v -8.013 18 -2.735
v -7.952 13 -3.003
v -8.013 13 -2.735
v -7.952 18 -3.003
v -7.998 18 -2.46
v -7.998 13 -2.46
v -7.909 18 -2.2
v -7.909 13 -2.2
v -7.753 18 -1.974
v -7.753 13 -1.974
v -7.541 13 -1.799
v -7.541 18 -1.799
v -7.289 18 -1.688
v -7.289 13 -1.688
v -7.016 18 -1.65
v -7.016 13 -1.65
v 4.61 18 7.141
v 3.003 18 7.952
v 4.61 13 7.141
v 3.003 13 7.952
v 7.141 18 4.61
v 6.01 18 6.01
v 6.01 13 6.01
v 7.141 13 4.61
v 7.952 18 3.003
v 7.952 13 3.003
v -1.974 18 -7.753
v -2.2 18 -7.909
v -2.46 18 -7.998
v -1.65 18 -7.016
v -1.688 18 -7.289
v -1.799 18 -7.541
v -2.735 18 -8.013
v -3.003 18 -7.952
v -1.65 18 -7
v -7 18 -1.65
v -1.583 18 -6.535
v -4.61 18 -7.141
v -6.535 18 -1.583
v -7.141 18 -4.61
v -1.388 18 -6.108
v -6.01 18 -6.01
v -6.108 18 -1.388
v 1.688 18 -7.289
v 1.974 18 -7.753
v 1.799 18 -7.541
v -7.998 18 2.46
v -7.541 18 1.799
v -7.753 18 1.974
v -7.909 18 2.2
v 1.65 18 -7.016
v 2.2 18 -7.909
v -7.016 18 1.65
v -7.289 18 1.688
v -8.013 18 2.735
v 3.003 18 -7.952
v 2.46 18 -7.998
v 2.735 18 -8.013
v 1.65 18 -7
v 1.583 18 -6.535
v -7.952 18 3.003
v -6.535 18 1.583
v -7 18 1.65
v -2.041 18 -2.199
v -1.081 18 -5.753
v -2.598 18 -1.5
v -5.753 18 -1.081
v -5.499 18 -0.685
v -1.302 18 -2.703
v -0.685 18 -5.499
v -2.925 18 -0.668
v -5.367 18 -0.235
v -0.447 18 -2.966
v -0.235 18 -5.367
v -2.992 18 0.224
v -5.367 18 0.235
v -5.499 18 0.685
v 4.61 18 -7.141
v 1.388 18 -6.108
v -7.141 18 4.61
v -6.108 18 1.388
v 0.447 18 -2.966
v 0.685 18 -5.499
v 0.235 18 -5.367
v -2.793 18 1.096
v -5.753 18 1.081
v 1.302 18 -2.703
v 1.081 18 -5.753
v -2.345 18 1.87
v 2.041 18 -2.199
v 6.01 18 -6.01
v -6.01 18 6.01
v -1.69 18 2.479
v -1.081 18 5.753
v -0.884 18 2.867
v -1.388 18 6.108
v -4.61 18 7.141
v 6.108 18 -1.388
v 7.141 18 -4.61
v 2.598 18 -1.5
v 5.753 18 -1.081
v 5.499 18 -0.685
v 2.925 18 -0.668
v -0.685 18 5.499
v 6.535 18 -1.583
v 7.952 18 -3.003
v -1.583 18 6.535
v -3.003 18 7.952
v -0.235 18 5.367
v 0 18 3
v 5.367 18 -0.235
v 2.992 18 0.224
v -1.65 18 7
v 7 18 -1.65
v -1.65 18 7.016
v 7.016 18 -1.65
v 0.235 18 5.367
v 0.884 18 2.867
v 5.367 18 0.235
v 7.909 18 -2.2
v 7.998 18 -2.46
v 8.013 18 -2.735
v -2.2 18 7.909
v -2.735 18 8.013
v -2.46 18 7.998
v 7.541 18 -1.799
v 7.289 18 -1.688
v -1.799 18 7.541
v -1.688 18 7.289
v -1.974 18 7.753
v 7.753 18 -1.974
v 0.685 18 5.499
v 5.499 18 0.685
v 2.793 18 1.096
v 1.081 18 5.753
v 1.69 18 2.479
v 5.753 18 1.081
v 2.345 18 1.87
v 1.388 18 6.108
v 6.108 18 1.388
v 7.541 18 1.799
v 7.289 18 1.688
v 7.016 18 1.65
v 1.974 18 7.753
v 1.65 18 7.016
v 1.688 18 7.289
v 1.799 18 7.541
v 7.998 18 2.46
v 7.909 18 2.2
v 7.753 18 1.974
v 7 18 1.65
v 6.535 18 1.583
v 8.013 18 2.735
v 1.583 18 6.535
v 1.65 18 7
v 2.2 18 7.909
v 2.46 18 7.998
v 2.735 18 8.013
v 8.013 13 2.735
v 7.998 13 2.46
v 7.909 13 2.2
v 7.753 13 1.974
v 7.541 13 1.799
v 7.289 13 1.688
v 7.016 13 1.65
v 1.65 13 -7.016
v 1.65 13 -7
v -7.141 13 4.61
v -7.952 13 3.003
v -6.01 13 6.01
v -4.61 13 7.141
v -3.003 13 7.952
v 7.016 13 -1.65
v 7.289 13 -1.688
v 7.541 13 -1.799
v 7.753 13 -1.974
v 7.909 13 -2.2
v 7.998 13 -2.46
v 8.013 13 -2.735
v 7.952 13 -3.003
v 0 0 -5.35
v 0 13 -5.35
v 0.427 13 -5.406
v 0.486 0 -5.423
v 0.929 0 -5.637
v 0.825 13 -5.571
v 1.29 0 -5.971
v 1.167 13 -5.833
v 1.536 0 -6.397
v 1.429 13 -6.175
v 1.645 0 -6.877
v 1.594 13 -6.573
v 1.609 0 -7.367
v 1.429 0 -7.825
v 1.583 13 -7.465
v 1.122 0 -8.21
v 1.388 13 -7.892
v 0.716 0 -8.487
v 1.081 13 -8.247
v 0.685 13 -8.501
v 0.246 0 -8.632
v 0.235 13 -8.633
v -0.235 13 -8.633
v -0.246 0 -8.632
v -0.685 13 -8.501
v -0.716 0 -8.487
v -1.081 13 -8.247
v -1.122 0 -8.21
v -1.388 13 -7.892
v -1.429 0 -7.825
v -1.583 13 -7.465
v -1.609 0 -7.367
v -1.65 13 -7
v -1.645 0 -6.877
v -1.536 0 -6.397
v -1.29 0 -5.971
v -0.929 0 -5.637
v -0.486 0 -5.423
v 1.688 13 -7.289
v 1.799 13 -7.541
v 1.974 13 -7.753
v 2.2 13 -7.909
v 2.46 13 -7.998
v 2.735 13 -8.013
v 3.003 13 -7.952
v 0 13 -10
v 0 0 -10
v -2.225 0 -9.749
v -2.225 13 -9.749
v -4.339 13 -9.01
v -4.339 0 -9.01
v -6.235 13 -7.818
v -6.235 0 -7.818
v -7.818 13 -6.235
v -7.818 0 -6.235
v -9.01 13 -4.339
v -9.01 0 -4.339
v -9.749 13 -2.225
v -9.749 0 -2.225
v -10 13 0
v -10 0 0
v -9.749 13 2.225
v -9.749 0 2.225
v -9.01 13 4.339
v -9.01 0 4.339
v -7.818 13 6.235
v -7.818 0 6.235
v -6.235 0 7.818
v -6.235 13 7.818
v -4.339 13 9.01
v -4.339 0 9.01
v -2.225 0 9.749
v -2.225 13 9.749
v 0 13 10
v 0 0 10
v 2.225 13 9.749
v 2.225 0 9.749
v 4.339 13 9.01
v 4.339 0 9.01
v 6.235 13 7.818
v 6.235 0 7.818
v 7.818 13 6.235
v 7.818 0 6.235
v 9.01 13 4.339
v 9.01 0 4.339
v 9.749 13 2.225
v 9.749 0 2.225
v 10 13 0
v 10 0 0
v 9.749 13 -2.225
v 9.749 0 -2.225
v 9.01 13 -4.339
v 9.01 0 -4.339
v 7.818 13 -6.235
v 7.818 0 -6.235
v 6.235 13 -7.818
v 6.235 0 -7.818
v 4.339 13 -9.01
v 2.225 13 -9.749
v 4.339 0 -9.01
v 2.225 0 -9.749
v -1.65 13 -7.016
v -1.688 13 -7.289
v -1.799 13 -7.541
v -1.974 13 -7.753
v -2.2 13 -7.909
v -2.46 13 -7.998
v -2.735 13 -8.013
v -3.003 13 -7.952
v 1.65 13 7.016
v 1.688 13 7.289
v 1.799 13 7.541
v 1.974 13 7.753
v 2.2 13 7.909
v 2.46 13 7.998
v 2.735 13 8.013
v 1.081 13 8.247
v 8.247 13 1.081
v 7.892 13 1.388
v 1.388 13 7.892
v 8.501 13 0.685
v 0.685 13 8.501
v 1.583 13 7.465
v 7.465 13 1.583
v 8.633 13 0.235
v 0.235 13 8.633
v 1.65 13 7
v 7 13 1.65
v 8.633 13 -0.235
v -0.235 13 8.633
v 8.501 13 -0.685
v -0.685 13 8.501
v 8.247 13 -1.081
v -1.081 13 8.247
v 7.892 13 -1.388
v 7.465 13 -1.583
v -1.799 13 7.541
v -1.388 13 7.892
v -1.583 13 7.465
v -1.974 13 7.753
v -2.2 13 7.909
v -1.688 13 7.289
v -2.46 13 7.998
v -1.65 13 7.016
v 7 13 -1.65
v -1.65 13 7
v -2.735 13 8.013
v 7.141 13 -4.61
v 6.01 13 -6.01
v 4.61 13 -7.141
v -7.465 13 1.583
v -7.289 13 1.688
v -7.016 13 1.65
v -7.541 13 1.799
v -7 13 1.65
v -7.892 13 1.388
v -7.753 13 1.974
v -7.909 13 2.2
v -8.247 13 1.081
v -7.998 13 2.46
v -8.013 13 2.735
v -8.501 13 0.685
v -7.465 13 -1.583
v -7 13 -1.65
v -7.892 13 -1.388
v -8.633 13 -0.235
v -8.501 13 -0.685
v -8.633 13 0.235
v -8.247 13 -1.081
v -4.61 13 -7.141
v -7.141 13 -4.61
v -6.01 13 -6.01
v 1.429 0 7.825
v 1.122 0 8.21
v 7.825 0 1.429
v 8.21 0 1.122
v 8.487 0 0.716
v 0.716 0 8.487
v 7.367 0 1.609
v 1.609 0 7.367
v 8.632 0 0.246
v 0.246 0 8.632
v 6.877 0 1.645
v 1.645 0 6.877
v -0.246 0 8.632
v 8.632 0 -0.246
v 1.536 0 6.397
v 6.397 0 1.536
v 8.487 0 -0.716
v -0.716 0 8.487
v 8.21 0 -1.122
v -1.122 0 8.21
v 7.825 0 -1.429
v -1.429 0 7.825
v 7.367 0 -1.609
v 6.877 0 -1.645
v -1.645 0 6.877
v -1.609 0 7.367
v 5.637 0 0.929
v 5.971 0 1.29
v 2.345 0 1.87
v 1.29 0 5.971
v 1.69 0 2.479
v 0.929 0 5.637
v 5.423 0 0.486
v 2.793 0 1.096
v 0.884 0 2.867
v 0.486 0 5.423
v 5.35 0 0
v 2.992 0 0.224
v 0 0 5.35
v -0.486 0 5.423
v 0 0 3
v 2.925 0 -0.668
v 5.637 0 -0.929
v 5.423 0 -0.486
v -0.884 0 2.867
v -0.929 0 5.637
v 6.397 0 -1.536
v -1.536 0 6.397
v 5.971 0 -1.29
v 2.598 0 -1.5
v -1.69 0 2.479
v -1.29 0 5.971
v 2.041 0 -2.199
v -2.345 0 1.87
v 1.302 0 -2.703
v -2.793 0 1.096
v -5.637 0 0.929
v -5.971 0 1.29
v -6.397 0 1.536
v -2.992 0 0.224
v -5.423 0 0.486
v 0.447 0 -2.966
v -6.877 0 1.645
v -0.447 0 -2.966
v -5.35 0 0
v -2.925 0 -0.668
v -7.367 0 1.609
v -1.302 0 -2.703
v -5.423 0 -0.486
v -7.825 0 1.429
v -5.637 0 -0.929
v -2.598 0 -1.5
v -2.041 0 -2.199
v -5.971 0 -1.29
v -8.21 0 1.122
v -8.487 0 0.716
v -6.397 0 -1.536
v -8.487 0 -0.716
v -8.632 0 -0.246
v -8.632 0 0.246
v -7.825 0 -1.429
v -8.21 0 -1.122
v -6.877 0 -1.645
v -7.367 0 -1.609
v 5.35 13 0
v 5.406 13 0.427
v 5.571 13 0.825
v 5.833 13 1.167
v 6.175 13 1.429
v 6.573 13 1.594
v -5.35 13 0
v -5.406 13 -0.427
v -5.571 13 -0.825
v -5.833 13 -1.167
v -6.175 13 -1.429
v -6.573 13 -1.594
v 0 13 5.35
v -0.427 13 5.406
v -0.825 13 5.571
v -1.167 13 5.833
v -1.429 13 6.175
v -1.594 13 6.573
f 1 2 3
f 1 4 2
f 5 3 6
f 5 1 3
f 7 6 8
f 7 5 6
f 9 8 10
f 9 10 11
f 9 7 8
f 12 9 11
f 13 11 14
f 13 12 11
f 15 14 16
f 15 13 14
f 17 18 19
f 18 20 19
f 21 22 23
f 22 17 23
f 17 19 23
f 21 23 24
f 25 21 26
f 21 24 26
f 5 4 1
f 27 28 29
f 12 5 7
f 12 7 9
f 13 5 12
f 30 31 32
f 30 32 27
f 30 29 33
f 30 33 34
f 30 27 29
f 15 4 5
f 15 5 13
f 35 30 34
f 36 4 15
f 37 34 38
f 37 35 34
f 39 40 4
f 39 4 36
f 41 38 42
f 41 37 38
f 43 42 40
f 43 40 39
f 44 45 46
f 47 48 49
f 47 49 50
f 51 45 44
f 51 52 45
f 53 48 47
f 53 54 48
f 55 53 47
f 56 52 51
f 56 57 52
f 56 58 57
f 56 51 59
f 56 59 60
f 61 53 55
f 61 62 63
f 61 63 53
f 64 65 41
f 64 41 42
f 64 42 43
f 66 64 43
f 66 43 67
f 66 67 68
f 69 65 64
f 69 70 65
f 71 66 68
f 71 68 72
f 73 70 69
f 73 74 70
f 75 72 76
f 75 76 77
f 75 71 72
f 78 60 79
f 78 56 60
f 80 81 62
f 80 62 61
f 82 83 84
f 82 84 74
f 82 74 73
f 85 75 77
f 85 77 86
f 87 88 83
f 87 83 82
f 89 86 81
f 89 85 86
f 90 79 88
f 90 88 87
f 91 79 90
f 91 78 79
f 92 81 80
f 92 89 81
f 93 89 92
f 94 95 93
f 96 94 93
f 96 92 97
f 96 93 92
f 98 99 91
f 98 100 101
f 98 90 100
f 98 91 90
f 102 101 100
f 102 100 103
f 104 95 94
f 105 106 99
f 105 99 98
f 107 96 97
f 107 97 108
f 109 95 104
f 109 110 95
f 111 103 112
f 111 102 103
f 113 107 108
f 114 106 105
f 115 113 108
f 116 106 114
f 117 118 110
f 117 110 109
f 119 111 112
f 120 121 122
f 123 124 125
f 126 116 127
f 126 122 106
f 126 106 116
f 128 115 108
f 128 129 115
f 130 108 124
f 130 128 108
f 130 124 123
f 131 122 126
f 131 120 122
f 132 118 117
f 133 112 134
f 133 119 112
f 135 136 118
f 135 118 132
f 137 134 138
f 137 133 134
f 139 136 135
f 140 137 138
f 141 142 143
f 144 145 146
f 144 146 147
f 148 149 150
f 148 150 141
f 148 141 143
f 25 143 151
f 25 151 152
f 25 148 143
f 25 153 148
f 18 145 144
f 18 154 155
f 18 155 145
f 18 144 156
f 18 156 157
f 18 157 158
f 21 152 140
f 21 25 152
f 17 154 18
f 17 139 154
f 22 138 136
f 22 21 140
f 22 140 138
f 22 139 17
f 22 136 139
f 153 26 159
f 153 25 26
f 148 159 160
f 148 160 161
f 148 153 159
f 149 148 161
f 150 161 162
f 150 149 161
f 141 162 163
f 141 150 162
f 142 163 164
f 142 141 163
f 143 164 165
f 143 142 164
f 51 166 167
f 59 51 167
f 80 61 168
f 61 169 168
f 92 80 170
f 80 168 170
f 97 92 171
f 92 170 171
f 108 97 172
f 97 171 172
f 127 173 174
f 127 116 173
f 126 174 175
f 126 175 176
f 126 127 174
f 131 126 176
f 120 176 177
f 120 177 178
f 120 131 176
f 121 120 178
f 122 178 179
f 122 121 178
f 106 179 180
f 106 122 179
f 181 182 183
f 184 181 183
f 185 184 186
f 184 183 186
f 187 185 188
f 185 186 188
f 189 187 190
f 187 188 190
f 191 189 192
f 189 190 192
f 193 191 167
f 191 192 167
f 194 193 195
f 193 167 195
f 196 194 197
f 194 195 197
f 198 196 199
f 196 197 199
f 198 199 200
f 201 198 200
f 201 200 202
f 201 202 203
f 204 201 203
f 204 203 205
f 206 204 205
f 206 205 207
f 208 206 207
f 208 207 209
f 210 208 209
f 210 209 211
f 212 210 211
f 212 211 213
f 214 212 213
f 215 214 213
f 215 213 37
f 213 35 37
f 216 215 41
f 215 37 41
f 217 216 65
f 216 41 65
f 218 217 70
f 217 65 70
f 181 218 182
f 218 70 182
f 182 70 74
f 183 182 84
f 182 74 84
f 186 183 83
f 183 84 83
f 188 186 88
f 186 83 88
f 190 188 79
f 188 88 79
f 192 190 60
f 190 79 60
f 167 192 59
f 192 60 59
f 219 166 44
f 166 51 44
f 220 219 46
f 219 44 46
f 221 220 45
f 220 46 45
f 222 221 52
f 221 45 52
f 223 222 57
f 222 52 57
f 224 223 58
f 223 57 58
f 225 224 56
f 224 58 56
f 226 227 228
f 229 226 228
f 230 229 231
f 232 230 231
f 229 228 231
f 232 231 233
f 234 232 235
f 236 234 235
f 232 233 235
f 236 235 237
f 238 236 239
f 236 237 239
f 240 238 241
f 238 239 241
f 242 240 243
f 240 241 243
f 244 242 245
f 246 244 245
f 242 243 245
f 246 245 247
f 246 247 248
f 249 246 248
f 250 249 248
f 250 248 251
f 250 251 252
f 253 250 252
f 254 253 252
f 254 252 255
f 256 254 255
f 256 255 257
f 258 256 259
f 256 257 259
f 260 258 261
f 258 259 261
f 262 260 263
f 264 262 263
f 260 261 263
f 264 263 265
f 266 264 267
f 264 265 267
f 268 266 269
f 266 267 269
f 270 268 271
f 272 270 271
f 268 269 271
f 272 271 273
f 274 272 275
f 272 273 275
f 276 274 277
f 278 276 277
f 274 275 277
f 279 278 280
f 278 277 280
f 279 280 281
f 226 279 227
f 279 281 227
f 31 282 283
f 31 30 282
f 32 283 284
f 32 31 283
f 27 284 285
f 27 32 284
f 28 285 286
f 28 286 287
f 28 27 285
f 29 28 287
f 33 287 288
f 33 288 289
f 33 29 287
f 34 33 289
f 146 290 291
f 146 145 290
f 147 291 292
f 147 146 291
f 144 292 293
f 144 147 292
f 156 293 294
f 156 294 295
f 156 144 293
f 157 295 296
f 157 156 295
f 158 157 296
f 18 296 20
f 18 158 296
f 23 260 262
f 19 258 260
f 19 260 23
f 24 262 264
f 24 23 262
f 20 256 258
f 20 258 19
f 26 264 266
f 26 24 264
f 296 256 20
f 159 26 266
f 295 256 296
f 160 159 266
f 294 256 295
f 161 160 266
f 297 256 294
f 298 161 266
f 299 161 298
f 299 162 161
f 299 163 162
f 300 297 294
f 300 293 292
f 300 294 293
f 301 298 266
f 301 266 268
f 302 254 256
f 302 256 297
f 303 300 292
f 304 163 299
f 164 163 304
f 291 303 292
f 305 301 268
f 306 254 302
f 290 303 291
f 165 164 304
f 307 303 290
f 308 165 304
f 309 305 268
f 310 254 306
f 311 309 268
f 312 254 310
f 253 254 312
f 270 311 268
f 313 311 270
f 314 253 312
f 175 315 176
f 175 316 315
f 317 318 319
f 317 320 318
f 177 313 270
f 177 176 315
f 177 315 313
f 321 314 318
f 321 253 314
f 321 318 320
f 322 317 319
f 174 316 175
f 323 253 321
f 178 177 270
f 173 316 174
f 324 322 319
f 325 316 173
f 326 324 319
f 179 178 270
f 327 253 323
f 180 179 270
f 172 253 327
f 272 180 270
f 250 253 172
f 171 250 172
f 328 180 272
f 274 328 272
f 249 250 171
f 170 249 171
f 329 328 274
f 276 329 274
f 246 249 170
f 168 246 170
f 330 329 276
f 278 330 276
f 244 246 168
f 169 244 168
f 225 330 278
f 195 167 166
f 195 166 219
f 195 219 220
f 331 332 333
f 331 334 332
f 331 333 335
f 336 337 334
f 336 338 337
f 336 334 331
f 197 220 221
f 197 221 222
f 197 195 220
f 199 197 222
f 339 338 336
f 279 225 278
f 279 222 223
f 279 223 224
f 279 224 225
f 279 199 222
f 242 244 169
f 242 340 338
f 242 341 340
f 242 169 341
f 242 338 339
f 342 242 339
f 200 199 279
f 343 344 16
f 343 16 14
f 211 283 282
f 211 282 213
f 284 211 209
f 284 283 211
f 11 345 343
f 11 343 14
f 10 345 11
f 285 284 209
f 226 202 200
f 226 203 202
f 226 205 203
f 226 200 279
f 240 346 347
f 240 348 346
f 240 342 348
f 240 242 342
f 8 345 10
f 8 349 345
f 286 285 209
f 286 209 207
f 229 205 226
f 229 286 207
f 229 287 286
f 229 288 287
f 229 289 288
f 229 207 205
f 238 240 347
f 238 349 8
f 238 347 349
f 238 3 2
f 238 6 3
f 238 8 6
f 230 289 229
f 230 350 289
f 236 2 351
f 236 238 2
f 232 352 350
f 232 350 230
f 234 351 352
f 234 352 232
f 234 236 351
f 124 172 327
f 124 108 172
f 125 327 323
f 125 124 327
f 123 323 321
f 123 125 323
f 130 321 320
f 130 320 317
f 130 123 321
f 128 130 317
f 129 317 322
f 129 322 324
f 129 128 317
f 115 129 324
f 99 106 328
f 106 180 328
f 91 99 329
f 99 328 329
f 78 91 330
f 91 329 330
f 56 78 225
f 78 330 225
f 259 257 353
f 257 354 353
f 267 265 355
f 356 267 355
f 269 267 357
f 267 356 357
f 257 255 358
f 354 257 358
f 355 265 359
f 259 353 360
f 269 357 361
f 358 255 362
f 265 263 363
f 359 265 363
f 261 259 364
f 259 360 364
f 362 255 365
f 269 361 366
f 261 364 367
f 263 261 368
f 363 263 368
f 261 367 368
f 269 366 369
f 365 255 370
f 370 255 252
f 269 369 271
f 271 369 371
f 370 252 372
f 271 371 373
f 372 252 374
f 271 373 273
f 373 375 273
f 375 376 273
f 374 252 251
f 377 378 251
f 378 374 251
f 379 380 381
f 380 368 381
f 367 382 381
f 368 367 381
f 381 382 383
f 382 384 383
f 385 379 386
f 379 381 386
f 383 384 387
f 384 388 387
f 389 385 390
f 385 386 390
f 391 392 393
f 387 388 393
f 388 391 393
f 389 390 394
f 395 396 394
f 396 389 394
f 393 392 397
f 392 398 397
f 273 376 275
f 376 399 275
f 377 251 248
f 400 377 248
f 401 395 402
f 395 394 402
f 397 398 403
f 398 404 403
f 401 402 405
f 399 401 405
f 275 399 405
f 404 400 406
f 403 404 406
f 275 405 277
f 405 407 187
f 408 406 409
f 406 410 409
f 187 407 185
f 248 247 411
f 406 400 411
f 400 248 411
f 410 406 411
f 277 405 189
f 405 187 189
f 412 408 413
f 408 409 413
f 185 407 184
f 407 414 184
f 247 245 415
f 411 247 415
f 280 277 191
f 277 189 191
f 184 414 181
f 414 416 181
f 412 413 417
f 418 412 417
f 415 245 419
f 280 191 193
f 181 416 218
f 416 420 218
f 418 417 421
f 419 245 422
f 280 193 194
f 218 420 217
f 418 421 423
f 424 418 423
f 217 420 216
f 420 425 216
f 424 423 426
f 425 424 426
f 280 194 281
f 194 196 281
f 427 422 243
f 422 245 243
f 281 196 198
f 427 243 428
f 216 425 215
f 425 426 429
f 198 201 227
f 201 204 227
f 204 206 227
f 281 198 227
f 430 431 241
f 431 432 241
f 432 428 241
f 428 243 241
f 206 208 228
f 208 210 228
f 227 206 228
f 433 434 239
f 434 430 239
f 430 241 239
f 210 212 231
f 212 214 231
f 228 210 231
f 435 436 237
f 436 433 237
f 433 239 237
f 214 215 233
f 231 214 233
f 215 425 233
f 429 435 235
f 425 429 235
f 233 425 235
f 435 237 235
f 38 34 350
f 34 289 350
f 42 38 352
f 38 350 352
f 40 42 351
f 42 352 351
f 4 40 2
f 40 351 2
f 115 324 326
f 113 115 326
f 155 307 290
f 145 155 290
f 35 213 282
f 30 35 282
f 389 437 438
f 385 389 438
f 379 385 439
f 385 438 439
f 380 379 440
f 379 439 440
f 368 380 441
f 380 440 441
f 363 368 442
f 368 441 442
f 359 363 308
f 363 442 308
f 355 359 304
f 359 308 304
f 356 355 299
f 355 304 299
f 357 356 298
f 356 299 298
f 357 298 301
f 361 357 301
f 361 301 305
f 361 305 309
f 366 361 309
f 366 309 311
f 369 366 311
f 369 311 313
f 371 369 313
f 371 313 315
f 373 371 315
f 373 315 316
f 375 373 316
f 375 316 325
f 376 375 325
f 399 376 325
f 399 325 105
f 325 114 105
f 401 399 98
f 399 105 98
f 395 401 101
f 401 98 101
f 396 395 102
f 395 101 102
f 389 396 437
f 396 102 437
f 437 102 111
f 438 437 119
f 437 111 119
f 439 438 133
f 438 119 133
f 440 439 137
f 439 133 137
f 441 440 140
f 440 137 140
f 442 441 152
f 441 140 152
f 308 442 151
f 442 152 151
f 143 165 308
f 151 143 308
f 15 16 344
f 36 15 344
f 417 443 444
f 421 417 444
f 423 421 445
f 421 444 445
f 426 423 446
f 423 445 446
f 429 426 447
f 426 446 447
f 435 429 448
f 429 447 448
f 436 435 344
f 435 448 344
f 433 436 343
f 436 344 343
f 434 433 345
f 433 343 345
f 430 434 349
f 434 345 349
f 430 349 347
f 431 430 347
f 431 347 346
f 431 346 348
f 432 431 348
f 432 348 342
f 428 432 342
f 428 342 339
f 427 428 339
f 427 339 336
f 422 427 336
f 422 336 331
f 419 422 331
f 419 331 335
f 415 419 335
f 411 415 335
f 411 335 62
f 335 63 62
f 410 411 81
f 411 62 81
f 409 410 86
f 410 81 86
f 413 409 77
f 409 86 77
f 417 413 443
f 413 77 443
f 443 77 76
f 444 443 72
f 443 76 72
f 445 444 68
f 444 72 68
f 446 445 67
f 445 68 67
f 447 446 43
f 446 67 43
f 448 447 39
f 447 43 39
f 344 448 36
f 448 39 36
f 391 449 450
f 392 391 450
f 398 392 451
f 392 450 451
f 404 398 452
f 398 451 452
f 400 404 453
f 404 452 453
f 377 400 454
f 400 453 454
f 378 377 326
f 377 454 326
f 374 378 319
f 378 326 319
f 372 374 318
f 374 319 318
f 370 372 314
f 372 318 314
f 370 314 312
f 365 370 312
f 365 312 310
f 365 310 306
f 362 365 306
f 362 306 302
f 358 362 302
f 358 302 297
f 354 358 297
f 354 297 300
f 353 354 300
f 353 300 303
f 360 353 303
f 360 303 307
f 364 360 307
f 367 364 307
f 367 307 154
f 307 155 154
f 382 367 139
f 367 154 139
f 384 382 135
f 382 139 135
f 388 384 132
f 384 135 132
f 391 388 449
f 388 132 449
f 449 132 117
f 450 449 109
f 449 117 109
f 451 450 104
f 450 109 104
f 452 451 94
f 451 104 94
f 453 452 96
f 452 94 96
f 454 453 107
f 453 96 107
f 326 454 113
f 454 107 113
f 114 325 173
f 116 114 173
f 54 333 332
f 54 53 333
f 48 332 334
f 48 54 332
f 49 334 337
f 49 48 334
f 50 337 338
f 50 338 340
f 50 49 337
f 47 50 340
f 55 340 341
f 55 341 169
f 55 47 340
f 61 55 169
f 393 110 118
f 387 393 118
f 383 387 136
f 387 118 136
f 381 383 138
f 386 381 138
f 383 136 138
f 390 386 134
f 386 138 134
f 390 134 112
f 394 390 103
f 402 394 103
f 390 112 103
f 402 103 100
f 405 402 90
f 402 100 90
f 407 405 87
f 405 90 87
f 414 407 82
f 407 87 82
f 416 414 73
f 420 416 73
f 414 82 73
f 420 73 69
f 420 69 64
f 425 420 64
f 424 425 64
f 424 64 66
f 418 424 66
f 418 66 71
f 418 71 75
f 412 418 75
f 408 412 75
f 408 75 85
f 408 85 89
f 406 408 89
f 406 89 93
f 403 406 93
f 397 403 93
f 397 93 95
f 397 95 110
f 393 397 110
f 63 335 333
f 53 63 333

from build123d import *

# Parameters (mm, degrees)
SKETCH_1_R                       = 10
EXTRUDE_358_DEPTH                = 13
SKETCH_2_R                       = 8.5
EXTRUDE_447_DEPTH                = 5
SKETCH_3_R                       = 3
CUT_EXTRUDE_558_DEPTH            = 23.891046285
CUT_EXTRUDE_START                = -5
CUT_EXTRUDE_755_DEPTH            = 5
SKETCH_5_R                       = 1.65
CUT_EXTRUDE_910_DEPTH            = 20.209372712
FILLET_1_R                       = 1
PATTERN_CIRCULAR_1_COUNT         = 4
FILLET_1_OF_PATTERN_CIRCULAR_1_R = 1


with BuildPart() as part:
    # Эскиз1 → Extrude 358 (new body)
    with BuildSketch(Plane(origin=(0, 0, 0), x_dir=(1, 0, 0), z_dir=(0, 1, 0))):
        with Locations(Location((0, 0, 0), (0, 0, 90))):
            Circle(SKETCH_1_R)
    extrude(amount=EXTRUDE_358_DEPTH)

    # Эскиз2 → Extrude 447 (add)
    with BuildSketch(Plane(origin=(0, 13, 0), x_dir=(1, 0, 0), z_dir=(0, 1, 0))):
        with Locations(Location((0, 0, 0), (0, 0, 270))):
            Circle(SKETCH_2_R)
    extrude(amount=EXTRUDE_447_DEPTH)

    # Эскиз3 → Cut-Extrude 558 (cut, through all)
    with BuildSketch(Plane(origin=(0, 18, 0), x_dir=(1, 0, 0), z_dir=(0, 1, 0))):
        with Locations(Location((0, 0, 0), (0, 0, 270))):
            Circle(SKETCH_3_R)
    extrude(amount=-CUT_EXTRUDE_558_DEPTH, mode=Mode.SUBTRACT)

    # Эскиз4 → Cut-Extrude 755 (cut)
    with BuildSketch(Plane(origin=(0, 18, 0), x_dir=(1, 0, 0), z_dir=(0, 1, 0)).offset(CUT_EXTRUDE_START)):
        with BuildLine():
            Line((-1.65, 7), (-1.65, 8.338315178))
            ThreePointArc((-1.65, 8.338315178), (0, 8.5), (1.65, 8.338315178))
            Line((1.65, 8.338315178), (1.65, 7))
            ThreePointArc((1.65, 7), (0, 5.35), (-1.65, 7))
        make_face()
    cut_extrude_755 = extrude(amount=CUT_EXTRUDE_755_DEPTH, mode=Mode.SUBTRACT)

    # Эскиз5 → Cut-Extrude 910 (cut, through all)
    with BuildSketch(Plane(origin=(0, 13, 0), x_dir=(1, 0, 0), z_dir=(0, 1, 0))):
        with Locations(Location((0, 7, 0), (0, 0, 270))):
            Circle(SKETCH_5_R)
    cut_extrude_910 = extrude(amount=-CUT_EXTRUDE_910_DEPTH, mode=Mode.SUBTRACT)

    # Скругление1
    fillet_1_edges = [part.edges().sort_by_distance(p)[0] for p in [
        (-1.65, 15.5, -8.338315178),
        (1.65, 15.5, -8.338315178),
    ]]
    fillet(fillet_1_edges, radius=FILLET_1_R)

    # Круговой массив1: Cut-Extrude 755, Cut-Extrude 910 ×4 about axis
    pattern_circular_1_axis = Axis((0, 0, 0), (0, 1, 0))
    add([cut_extrude_755.rotate(pattern_circular_1_axis, i * 360 / PATTERN_CIRCULAR_1_COUNT) for i in range(1, PATTERN_CIRCULAR_1_COUNT)], mode=Mode.SUBTRACT)
    add([cut_extrude_910.rotate(pattern_circular_1_axis, i * 360 / PATTERN_CIRCULAR_1_COUNT) for i in range(1, PATTERN_CIRCULAR_1_COUNT)], mode=Mode.SUBTRACT)

    # Скругление1 of Круговой массив1
    fillet_1_of_pattern_circular_1_edges = [part.edges().sort_by_distance(p)[0] for p in [
        (-8.338315178, 15.5, 1.65),
        (-8.338315178, 15.5, -1.65),
        (1.65, 15.5, 8.338315178),
        (-1.65, 15.5, 8.338315178),
        (8.338315178, 15.5, -1.65),
        (8.338315178, 15.5, 1.65),
    ]]
    fillet(fillet_1_of_pattern_circular_1_edges, radius=FILLET_1_OF_PATTERN_CIRCULAR_1_R)


solid = part.part
